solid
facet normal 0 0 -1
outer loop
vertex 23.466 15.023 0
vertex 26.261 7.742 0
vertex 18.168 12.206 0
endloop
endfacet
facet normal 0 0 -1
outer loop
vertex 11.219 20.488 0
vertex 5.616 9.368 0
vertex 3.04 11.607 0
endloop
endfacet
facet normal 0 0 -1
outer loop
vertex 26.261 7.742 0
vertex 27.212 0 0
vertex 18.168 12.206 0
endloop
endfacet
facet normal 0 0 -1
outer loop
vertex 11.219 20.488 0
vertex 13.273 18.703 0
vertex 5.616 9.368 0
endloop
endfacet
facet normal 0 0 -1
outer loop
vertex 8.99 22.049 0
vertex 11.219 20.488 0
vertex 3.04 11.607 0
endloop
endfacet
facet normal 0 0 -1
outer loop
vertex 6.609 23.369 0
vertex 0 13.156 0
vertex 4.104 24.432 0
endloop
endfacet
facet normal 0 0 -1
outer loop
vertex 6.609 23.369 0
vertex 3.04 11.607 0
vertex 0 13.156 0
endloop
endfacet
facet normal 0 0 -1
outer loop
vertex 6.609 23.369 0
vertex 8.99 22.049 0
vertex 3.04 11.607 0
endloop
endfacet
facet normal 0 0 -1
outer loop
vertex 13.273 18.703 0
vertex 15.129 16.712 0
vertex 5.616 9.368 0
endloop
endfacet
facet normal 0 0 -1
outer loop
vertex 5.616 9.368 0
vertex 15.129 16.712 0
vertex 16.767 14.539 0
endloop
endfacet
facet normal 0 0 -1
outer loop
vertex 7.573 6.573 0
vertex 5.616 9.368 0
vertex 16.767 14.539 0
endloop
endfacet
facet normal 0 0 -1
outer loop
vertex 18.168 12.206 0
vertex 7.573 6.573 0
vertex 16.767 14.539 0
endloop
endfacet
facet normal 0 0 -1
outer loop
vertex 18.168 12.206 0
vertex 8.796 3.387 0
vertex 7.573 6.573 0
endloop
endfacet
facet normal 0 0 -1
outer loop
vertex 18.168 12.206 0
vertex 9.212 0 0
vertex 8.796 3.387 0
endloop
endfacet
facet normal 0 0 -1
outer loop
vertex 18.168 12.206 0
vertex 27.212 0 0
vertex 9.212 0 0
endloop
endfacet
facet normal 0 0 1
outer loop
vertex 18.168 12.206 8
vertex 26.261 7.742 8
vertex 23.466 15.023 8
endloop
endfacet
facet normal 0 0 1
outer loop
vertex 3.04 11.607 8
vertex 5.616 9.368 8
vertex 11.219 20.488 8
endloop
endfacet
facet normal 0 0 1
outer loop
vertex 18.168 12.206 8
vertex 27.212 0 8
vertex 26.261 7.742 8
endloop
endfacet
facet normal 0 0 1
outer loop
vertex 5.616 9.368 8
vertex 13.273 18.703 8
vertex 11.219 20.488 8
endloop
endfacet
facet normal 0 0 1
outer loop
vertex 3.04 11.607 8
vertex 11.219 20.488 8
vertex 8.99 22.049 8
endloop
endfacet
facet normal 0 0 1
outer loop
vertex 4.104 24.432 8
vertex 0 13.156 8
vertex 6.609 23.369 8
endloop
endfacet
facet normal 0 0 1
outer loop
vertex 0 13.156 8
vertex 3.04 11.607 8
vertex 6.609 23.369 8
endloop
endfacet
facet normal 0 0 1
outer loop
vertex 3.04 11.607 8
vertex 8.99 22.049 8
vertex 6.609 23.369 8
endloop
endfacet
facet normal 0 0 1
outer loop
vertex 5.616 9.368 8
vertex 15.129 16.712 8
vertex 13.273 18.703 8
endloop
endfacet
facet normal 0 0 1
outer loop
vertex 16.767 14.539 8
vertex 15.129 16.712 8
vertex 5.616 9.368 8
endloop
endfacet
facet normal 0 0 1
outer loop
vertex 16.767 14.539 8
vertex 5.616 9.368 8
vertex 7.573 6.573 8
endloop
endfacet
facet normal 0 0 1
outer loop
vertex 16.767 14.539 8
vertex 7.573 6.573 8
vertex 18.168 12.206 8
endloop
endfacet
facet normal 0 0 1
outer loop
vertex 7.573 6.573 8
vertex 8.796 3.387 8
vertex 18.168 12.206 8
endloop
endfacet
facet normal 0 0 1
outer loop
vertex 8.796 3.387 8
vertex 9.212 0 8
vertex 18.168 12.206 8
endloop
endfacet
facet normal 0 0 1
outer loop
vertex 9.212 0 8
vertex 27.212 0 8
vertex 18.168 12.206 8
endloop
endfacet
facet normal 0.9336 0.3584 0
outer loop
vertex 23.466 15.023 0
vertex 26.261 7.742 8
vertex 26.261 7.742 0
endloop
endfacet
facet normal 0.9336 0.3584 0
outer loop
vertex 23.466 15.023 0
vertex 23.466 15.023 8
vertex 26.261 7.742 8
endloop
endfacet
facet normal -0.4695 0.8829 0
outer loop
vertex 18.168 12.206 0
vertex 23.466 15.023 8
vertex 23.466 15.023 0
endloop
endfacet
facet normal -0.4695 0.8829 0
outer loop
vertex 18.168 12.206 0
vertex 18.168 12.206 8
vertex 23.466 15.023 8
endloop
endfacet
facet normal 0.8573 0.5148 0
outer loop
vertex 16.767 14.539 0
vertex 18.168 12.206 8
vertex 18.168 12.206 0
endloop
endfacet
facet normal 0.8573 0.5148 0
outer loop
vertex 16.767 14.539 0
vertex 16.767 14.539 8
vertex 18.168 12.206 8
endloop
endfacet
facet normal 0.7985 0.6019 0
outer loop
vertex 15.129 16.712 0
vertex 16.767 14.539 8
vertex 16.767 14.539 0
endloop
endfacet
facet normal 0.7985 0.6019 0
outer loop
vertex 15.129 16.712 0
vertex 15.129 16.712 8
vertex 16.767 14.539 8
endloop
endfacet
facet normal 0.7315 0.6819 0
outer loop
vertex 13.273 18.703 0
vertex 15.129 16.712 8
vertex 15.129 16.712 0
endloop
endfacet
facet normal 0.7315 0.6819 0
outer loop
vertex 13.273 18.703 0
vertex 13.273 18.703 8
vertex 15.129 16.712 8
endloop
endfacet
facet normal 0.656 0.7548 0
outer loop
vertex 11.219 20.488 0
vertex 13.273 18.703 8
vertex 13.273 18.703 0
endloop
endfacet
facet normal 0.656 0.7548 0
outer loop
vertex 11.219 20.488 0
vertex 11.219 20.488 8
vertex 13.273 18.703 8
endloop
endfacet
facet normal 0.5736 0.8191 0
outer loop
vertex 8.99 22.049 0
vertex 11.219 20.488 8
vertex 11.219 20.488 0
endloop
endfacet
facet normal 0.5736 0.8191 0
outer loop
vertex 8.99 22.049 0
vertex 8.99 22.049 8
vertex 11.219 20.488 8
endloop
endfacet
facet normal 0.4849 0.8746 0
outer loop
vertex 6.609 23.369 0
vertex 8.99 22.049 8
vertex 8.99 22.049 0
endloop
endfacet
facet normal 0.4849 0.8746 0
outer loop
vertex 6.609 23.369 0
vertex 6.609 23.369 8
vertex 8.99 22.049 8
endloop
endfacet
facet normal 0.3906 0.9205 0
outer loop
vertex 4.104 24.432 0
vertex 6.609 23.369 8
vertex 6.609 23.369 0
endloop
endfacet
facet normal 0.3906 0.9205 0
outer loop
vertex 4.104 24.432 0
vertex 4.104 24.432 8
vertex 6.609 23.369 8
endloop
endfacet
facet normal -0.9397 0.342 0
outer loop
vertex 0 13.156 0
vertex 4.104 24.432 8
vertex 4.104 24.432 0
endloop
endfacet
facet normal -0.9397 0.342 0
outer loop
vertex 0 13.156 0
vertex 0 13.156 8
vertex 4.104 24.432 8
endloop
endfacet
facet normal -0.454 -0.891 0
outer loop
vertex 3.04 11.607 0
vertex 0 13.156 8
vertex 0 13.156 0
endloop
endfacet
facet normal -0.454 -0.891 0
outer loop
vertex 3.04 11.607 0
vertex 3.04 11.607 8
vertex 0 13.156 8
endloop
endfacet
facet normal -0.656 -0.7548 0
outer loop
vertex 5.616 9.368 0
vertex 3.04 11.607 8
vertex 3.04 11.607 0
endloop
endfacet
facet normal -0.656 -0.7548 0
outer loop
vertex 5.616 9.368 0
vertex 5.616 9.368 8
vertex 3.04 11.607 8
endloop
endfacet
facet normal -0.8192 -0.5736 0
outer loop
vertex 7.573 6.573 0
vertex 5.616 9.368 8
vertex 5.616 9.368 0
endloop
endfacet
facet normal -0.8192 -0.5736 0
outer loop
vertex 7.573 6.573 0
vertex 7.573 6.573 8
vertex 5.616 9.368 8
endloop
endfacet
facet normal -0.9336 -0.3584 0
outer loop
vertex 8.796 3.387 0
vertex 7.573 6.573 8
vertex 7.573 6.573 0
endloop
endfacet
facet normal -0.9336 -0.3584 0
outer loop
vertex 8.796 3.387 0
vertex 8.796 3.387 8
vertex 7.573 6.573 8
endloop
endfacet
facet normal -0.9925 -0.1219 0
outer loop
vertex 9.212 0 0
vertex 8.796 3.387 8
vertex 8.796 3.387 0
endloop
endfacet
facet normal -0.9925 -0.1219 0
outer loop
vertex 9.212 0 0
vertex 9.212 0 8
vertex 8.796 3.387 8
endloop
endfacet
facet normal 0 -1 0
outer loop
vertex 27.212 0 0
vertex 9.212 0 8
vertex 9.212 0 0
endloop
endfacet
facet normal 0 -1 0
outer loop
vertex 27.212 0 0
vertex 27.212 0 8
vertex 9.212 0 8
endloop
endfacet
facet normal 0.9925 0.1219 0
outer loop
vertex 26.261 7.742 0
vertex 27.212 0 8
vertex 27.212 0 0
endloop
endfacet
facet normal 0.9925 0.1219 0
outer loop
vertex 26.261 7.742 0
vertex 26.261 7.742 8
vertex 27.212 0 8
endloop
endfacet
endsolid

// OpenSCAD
$fn = 32;

// ----------------------------------------------------------------------
// Arc stop: segment, 8 mm thick
// ----------------------------------------------------------------------

// --- parameters (mm) ---
profile_height = 8;       // extrusion height
profile_points = 17;      // points of the closed outline

profile = [[27.212, 0], [26.261, 7.742], [23.466, 15.023], [18.168, 12.206], [16.767, 14.539], [15.129, 16.712], [13.273, 18.703], [11.219, 20.488], [8.99, 22.049], [6.609, 23.369], [4.104, 24.432], [0, 13.156], [3.04, 11.607], [5.616, 9.368], [7.573, 6.573], [8.796, 3.387], [9.212, 0]];  // single closed polygon, 17 points, counter clockwise

// --- the one profile operation ---
linear_extrude(height = profile_height) polygon(points = profile);
